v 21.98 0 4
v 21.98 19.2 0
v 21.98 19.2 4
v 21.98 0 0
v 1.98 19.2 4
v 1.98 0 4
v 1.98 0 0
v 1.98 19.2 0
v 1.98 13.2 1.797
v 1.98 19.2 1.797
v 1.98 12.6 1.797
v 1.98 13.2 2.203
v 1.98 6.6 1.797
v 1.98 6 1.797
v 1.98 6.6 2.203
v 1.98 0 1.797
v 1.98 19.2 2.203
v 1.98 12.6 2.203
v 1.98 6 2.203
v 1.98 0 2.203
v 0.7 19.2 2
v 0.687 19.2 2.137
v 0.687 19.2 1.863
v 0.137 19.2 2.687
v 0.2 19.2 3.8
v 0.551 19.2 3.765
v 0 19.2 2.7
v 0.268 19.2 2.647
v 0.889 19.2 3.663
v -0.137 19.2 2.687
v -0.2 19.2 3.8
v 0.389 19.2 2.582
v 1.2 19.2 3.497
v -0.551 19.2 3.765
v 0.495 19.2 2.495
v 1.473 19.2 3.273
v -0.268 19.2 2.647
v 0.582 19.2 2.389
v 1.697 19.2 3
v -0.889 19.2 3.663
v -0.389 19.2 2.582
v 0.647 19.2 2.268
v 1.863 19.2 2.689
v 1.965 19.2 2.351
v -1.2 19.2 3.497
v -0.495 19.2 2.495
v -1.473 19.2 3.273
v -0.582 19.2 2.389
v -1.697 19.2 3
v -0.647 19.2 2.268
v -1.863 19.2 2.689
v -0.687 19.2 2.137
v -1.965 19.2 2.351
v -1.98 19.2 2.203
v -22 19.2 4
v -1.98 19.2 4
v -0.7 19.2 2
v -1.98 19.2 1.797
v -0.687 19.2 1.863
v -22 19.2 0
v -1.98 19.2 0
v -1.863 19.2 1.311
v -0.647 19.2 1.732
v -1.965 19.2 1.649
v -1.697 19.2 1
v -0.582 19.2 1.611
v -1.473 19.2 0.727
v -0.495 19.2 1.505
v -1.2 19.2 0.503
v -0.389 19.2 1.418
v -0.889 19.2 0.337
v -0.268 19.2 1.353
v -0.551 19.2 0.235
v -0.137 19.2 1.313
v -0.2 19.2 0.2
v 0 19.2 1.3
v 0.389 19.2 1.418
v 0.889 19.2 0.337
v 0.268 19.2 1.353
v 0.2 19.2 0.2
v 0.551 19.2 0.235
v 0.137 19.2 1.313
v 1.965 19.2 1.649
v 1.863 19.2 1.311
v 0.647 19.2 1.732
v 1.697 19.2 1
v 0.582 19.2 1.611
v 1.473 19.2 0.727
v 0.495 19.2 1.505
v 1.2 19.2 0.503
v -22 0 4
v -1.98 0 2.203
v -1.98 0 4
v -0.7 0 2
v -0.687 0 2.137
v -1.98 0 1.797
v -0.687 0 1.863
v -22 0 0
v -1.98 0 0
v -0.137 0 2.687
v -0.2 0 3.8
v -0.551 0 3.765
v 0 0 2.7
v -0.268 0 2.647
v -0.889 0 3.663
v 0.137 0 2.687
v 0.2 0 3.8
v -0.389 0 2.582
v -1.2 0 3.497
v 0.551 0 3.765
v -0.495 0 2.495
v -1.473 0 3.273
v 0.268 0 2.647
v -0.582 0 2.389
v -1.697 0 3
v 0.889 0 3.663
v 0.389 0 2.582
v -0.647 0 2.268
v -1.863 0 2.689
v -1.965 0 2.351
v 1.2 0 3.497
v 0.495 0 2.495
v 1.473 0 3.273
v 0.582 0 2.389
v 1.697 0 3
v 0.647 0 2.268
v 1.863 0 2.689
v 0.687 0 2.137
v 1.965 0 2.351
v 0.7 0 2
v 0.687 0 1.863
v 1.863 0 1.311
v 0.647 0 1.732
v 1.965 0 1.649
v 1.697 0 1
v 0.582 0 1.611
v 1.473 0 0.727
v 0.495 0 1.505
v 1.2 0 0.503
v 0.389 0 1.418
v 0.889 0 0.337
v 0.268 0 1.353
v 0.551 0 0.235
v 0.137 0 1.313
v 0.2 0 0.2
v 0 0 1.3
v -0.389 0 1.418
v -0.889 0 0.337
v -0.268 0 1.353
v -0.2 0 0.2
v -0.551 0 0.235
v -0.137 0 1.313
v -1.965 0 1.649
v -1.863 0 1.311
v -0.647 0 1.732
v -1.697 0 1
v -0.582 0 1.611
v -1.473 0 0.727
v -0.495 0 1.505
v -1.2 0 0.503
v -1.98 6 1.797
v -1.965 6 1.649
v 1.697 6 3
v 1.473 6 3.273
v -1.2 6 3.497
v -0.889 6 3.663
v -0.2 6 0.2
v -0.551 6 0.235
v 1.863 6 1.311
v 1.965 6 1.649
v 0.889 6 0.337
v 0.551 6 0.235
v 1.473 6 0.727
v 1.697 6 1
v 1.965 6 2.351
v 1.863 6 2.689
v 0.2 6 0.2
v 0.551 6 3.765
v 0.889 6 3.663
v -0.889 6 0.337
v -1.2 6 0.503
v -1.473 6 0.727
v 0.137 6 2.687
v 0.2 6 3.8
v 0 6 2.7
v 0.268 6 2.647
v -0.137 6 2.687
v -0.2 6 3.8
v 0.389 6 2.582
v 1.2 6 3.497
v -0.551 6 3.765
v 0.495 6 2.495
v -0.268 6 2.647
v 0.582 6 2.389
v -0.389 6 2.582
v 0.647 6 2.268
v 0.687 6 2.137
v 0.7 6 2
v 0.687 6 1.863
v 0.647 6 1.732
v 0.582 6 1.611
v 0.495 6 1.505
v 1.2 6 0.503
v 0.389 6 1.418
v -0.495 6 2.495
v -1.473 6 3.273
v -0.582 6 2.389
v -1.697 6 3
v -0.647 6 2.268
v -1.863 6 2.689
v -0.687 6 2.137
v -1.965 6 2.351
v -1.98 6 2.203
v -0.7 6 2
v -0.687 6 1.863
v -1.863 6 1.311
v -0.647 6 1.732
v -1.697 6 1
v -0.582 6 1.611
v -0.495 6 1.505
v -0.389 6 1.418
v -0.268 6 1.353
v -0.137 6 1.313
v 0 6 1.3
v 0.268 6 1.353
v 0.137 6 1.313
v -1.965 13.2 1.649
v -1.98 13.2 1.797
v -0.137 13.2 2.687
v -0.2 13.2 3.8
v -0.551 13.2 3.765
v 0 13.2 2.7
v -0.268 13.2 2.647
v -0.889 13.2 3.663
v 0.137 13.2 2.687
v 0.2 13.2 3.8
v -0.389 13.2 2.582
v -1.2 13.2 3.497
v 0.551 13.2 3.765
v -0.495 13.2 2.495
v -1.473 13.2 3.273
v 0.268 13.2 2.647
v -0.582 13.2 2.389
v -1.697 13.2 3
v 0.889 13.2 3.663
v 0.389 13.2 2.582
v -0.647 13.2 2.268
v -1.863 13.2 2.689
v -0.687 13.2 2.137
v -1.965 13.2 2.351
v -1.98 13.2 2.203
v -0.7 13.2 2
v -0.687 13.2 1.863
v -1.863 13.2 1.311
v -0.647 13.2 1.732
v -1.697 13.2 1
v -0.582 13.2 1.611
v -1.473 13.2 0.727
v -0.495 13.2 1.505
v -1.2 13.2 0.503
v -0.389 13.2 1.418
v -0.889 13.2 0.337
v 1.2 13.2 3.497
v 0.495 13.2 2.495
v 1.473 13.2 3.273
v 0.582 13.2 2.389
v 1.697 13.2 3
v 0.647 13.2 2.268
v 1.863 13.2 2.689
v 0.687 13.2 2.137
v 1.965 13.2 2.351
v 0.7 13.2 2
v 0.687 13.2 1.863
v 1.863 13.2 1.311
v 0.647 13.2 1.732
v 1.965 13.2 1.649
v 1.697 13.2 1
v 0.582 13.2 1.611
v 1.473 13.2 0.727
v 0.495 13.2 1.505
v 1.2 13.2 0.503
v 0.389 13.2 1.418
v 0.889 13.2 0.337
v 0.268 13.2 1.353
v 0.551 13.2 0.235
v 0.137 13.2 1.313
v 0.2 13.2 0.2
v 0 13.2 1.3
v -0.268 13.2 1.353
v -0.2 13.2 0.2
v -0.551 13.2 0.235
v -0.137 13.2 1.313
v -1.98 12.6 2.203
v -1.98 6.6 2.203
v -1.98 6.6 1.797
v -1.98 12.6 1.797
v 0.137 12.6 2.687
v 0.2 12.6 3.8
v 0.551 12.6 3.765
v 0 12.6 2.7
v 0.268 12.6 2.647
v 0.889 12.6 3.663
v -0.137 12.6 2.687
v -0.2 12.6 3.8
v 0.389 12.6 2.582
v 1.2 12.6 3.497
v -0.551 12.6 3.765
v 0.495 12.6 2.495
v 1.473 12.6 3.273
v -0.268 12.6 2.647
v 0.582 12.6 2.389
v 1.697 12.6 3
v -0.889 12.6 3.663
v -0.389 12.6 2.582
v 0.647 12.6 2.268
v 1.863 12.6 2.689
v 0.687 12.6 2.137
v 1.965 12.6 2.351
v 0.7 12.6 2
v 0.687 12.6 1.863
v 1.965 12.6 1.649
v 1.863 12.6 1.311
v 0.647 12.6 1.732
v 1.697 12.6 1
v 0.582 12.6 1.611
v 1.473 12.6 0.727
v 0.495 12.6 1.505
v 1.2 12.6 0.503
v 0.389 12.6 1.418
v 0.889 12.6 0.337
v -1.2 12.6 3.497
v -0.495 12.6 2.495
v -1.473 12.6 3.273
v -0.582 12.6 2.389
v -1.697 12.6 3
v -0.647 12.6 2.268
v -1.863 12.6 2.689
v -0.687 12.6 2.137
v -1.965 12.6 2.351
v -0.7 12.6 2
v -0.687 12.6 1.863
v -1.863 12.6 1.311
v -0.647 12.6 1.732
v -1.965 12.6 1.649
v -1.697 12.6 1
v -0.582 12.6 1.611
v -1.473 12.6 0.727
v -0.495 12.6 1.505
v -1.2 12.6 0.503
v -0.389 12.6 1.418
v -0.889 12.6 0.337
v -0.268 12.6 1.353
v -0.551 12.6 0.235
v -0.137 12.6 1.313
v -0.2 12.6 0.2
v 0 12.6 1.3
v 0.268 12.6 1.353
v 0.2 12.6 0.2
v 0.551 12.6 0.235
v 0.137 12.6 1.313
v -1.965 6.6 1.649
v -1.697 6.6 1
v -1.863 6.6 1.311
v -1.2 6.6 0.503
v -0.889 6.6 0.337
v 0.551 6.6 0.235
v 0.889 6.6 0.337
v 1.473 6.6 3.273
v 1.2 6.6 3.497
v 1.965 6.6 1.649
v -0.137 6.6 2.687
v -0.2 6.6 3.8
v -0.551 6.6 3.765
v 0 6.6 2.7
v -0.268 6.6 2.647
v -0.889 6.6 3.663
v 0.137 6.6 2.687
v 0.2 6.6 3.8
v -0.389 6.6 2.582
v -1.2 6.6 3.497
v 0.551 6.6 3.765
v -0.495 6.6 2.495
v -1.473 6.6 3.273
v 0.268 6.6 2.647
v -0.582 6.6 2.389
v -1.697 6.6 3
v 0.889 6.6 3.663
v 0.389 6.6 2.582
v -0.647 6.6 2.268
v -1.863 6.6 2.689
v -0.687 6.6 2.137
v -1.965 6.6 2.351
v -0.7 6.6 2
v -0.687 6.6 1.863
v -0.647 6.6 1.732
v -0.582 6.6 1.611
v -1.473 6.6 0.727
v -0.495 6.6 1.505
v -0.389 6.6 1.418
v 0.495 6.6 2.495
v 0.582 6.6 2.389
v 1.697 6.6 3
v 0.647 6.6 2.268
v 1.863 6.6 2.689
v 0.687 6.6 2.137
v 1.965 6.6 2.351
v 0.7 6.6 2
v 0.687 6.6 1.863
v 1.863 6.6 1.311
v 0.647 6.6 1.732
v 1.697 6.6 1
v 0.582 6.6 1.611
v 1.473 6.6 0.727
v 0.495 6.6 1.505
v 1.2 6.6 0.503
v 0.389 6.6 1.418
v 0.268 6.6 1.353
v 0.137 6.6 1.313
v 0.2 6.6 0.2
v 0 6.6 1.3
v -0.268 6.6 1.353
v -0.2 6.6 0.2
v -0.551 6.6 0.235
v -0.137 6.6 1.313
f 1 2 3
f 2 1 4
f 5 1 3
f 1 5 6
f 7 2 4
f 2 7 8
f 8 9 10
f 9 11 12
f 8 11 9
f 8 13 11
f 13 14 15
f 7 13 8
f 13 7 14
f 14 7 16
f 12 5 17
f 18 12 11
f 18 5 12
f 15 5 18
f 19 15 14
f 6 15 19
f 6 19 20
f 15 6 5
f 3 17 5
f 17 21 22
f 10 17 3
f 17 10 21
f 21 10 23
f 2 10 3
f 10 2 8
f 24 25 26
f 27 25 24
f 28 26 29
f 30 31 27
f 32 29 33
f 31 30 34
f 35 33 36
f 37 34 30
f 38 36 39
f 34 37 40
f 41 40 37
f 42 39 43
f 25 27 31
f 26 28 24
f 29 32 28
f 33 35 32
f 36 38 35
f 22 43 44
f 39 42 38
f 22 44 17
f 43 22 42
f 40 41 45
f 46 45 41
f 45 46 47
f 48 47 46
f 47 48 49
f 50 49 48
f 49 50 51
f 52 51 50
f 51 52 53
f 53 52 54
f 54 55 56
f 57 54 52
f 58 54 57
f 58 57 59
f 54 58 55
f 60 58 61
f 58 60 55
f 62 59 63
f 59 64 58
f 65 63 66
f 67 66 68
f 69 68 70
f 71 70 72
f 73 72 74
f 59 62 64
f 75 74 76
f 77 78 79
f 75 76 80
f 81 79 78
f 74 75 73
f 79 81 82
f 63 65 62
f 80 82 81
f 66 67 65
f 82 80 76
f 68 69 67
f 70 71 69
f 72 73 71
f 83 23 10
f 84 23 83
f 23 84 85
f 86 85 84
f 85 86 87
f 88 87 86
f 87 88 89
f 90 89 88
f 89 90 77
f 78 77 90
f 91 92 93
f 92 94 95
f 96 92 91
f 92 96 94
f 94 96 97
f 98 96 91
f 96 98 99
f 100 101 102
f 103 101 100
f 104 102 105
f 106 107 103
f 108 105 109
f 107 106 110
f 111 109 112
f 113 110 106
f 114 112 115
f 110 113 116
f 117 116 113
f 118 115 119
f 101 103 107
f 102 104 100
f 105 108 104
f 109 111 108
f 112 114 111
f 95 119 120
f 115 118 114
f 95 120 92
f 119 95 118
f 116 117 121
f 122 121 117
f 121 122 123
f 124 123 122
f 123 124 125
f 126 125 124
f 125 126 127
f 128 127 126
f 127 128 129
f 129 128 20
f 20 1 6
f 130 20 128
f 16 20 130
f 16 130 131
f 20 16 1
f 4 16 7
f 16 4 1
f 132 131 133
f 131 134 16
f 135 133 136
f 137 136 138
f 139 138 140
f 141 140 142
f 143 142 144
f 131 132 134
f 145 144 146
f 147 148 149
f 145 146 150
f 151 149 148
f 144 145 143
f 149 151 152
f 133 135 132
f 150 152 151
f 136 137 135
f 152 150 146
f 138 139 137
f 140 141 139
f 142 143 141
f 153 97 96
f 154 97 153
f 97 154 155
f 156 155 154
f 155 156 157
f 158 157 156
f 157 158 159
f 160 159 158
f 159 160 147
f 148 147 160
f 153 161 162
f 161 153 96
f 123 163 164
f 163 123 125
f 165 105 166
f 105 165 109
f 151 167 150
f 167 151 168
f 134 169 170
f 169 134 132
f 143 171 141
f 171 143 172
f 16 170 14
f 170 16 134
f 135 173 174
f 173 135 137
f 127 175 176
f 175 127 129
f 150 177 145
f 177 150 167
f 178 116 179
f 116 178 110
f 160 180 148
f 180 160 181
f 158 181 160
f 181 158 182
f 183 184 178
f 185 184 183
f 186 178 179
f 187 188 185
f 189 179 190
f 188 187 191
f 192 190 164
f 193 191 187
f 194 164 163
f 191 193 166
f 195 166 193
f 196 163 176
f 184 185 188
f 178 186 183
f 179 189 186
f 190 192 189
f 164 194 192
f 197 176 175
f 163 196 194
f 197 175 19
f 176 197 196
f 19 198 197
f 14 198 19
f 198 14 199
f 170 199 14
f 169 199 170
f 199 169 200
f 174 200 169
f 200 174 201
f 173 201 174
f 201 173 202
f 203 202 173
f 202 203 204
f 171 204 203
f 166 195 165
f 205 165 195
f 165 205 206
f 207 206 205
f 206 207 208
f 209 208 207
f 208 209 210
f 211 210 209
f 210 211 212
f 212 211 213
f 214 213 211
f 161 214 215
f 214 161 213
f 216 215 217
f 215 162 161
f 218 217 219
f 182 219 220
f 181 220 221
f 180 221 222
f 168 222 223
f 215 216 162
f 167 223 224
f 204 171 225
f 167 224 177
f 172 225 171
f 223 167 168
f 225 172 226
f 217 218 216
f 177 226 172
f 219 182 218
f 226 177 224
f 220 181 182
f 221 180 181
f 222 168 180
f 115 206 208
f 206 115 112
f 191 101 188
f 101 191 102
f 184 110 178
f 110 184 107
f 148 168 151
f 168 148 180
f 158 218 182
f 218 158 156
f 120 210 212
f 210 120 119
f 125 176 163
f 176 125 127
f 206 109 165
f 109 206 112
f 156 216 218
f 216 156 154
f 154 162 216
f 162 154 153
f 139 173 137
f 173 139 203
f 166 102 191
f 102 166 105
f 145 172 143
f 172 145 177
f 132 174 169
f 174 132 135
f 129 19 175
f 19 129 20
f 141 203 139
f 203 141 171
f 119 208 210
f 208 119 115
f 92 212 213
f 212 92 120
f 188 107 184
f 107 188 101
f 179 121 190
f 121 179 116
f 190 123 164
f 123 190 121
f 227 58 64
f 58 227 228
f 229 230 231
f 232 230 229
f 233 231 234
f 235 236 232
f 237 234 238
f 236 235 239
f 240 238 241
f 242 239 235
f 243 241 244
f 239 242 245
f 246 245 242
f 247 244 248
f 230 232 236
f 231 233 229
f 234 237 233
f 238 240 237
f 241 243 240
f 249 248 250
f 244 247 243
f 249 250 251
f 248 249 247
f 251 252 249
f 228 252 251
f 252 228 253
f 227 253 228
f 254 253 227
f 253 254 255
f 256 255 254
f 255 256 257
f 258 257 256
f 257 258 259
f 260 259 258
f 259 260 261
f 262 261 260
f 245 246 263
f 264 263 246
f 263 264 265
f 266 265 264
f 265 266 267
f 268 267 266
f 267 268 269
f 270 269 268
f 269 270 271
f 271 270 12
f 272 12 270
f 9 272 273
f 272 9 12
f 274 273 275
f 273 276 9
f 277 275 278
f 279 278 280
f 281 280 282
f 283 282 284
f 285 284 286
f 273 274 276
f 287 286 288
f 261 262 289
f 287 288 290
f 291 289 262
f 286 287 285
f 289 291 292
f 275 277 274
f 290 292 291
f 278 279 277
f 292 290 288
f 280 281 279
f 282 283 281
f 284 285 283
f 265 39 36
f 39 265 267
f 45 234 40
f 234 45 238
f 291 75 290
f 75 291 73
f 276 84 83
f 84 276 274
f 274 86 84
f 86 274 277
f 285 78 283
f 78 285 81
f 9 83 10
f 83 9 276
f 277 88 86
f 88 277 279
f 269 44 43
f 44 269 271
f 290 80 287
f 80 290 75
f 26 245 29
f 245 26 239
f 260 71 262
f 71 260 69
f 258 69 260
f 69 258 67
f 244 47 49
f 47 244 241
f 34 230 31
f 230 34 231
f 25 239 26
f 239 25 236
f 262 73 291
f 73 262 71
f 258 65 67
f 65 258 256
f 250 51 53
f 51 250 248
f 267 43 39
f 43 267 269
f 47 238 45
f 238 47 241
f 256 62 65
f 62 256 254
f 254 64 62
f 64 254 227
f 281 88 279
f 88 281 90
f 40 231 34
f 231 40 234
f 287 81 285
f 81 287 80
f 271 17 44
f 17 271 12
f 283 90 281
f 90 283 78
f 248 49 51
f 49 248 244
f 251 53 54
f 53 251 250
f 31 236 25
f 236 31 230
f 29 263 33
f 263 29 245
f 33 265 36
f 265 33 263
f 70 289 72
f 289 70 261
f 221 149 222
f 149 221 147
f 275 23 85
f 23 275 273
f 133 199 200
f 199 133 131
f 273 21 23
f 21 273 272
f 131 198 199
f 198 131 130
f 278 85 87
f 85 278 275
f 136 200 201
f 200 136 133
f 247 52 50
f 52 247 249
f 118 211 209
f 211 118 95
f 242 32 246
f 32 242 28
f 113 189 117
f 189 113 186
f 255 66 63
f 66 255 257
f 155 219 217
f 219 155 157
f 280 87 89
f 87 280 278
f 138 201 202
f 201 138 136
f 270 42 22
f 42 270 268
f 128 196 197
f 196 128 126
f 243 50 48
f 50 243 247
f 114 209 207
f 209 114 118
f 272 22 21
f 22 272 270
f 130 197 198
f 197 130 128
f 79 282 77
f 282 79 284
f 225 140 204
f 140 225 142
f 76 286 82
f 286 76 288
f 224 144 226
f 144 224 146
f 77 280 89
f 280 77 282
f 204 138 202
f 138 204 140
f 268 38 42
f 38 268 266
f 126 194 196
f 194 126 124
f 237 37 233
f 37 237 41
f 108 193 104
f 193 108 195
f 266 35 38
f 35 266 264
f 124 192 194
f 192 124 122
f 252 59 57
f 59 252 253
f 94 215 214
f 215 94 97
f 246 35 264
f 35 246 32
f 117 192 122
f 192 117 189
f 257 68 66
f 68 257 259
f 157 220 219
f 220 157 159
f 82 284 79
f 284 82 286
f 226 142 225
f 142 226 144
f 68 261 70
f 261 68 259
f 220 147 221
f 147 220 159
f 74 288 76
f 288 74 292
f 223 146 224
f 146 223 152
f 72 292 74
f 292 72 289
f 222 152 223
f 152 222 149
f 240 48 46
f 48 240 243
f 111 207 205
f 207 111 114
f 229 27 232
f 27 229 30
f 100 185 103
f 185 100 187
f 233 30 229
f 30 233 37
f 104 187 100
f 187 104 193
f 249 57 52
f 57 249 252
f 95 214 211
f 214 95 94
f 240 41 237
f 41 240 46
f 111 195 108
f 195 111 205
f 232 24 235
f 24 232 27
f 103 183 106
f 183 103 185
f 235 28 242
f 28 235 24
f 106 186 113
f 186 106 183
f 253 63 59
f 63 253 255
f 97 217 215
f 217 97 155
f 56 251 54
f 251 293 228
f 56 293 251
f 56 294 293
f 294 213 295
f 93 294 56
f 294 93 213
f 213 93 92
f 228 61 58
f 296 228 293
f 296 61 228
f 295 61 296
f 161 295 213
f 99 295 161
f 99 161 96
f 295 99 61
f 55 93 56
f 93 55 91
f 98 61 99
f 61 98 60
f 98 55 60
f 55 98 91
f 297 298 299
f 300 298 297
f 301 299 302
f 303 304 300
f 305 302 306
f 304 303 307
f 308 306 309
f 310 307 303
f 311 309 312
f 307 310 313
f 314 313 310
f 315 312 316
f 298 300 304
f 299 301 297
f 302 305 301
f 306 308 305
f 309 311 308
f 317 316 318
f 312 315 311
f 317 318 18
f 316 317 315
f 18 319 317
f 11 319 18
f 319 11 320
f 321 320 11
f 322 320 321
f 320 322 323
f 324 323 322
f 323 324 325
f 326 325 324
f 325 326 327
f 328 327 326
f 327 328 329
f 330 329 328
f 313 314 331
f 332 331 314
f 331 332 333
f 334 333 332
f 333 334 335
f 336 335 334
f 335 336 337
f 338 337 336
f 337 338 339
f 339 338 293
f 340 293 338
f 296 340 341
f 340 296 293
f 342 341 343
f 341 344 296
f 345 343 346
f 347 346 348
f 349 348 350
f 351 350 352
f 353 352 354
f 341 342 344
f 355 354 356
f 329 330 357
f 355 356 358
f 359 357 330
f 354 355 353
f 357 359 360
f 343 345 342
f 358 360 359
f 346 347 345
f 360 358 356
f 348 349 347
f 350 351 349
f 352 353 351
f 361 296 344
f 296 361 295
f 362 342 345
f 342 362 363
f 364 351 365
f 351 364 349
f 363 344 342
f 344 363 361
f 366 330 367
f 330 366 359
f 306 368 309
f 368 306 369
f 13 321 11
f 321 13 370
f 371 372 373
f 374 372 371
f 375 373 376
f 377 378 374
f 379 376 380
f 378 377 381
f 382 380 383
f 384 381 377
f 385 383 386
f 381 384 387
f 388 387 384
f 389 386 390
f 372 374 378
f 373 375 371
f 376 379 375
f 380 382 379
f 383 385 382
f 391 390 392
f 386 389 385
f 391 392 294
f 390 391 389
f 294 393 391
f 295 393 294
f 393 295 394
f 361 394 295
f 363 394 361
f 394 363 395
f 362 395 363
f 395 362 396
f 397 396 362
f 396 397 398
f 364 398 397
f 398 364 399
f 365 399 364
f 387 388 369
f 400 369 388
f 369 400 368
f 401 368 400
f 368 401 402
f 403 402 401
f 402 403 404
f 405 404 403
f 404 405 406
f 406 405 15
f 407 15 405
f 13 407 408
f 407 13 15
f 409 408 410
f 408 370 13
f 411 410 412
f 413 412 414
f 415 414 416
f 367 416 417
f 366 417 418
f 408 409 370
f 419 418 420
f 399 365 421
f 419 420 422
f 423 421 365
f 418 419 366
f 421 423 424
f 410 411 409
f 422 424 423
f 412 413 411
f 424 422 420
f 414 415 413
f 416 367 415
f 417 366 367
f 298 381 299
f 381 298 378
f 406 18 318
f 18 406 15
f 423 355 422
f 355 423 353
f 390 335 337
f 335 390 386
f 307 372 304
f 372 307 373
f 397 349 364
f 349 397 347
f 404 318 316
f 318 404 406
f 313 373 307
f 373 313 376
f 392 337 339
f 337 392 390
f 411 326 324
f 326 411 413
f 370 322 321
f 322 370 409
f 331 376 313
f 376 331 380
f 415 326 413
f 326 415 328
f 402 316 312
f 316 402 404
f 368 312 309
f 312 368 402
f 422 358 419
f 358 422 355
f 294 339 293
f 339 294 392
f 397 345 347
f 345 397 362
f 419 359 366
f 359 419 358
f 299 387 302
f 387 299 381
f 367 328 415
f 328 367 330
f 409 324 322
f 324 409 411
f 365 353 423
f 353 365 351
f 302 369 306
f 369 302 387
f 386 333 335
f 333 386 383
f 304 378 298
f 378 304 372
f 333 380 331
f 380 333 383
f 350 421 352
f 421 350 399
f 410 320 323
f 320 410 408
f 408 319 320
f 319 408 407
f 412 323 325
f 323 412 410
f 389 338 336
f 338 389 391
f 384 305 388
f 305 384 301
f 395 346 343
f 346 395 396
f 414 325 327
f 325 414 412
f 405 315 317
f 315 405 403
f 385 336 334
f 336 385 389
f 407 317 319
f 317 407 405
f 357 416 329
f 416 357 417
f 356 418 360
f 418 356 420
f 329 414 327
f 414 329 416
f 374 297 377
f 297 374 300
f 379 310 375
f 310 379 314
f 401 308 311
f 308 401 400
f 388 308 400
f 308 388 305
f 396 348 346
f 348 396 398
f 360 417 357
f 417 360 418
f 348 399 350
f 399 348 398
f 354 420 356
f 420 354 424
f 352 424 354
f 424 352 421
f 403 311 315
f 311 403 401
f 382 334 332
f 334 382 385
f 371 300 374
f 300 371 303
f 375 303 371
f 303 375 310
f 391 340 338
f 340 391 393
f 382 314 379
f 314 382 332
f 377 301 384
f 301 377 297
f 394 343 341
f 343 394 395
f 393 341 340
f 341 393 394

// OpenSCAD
$fn = 32;

// core dims
plate_len = 20;
plate_thickness = 4;
knuckle_len = 6;
knuckle_gap = 0.6;
pin_d = 1;
pin_clear = 0.4;
wall = 1.0;

// 0 = flat/print orientation, 90 = fully folded (preview only)
hinge_angle = 0;

h = plate_thickness / 2;
pin_hole_r = pin_d / 2 + pin_clear / 2;

// recede must equal h for a pure body-contact 90 deg stop, and must
// stay >= pin_hole_r + wall so the pin hole has enough material around it
recede = h;
assert(recede >= pin_hole_r + wall, "plate_thickness too thin for this pin/wall");
eps = 0.02;

// discorectangle knuckle cap: as large as the thickness budget allows
// while keeping a small cushion over the minimum enclosure radius
cap_r = pin_hole_r + wall + 0.1;
straight = recede - cap_r;
assert(straight >= 0, "cap_r bigger than recede - increase plate_thickness");

n = 3;
hinge_width = n * knuckle_len + (n - 1) * knuckle_gap;

seg_y0 = [0, knuckle_len + knuckle_gap, 2 * (knuckle_len + knuckle_gap)];
seg_y1 = [seg_y0[0] + knuckle_len, seg_y0[1] + knuckle_len, seg_y0[2] + knuckle_len];

module knuckle(y0, y1) {
    translate([0, y0, h])
        rotate([-90, 0, 0])
            linear_extrude(height = y1 - y0)
                hull() {
                    translate([-straight, 0]) circle(r = cap_r);
                    translate([straight, 0]) circle(r = cap_r);
                }
}

module pin_hole() {
    translate([0, -1, h])
        rotate([-90, 0, 0])
            cylinder(h = hinge_width + 2, r = pin_hole_r);
}

module plate_a() {
    difference() {
        union() {
            translate([recede - eps, 0, 0]) cube([plate_len, hinge_width, plate_thickness]);
            knuckle(seg_y0[0], seg_y1[0]);
            knuckle(seg_y0[2], seg_y1[2]);
        }
        pin_hole();
    }
}

module plate_b() {
    difference() {
        union() {
            translate([-recede - plate_len, 0, 0]) cube([plate_len + eps, hinge_width, plate_thickness]);
            knuckle(seg_y0[1], seg_y1[1]);
        }
        pin_hole();
    }
}

plate_a();
translate([0, 0, h]) rotate([0, hinge_angle, 0]) translate([0, 0, -h]) plate_b();
